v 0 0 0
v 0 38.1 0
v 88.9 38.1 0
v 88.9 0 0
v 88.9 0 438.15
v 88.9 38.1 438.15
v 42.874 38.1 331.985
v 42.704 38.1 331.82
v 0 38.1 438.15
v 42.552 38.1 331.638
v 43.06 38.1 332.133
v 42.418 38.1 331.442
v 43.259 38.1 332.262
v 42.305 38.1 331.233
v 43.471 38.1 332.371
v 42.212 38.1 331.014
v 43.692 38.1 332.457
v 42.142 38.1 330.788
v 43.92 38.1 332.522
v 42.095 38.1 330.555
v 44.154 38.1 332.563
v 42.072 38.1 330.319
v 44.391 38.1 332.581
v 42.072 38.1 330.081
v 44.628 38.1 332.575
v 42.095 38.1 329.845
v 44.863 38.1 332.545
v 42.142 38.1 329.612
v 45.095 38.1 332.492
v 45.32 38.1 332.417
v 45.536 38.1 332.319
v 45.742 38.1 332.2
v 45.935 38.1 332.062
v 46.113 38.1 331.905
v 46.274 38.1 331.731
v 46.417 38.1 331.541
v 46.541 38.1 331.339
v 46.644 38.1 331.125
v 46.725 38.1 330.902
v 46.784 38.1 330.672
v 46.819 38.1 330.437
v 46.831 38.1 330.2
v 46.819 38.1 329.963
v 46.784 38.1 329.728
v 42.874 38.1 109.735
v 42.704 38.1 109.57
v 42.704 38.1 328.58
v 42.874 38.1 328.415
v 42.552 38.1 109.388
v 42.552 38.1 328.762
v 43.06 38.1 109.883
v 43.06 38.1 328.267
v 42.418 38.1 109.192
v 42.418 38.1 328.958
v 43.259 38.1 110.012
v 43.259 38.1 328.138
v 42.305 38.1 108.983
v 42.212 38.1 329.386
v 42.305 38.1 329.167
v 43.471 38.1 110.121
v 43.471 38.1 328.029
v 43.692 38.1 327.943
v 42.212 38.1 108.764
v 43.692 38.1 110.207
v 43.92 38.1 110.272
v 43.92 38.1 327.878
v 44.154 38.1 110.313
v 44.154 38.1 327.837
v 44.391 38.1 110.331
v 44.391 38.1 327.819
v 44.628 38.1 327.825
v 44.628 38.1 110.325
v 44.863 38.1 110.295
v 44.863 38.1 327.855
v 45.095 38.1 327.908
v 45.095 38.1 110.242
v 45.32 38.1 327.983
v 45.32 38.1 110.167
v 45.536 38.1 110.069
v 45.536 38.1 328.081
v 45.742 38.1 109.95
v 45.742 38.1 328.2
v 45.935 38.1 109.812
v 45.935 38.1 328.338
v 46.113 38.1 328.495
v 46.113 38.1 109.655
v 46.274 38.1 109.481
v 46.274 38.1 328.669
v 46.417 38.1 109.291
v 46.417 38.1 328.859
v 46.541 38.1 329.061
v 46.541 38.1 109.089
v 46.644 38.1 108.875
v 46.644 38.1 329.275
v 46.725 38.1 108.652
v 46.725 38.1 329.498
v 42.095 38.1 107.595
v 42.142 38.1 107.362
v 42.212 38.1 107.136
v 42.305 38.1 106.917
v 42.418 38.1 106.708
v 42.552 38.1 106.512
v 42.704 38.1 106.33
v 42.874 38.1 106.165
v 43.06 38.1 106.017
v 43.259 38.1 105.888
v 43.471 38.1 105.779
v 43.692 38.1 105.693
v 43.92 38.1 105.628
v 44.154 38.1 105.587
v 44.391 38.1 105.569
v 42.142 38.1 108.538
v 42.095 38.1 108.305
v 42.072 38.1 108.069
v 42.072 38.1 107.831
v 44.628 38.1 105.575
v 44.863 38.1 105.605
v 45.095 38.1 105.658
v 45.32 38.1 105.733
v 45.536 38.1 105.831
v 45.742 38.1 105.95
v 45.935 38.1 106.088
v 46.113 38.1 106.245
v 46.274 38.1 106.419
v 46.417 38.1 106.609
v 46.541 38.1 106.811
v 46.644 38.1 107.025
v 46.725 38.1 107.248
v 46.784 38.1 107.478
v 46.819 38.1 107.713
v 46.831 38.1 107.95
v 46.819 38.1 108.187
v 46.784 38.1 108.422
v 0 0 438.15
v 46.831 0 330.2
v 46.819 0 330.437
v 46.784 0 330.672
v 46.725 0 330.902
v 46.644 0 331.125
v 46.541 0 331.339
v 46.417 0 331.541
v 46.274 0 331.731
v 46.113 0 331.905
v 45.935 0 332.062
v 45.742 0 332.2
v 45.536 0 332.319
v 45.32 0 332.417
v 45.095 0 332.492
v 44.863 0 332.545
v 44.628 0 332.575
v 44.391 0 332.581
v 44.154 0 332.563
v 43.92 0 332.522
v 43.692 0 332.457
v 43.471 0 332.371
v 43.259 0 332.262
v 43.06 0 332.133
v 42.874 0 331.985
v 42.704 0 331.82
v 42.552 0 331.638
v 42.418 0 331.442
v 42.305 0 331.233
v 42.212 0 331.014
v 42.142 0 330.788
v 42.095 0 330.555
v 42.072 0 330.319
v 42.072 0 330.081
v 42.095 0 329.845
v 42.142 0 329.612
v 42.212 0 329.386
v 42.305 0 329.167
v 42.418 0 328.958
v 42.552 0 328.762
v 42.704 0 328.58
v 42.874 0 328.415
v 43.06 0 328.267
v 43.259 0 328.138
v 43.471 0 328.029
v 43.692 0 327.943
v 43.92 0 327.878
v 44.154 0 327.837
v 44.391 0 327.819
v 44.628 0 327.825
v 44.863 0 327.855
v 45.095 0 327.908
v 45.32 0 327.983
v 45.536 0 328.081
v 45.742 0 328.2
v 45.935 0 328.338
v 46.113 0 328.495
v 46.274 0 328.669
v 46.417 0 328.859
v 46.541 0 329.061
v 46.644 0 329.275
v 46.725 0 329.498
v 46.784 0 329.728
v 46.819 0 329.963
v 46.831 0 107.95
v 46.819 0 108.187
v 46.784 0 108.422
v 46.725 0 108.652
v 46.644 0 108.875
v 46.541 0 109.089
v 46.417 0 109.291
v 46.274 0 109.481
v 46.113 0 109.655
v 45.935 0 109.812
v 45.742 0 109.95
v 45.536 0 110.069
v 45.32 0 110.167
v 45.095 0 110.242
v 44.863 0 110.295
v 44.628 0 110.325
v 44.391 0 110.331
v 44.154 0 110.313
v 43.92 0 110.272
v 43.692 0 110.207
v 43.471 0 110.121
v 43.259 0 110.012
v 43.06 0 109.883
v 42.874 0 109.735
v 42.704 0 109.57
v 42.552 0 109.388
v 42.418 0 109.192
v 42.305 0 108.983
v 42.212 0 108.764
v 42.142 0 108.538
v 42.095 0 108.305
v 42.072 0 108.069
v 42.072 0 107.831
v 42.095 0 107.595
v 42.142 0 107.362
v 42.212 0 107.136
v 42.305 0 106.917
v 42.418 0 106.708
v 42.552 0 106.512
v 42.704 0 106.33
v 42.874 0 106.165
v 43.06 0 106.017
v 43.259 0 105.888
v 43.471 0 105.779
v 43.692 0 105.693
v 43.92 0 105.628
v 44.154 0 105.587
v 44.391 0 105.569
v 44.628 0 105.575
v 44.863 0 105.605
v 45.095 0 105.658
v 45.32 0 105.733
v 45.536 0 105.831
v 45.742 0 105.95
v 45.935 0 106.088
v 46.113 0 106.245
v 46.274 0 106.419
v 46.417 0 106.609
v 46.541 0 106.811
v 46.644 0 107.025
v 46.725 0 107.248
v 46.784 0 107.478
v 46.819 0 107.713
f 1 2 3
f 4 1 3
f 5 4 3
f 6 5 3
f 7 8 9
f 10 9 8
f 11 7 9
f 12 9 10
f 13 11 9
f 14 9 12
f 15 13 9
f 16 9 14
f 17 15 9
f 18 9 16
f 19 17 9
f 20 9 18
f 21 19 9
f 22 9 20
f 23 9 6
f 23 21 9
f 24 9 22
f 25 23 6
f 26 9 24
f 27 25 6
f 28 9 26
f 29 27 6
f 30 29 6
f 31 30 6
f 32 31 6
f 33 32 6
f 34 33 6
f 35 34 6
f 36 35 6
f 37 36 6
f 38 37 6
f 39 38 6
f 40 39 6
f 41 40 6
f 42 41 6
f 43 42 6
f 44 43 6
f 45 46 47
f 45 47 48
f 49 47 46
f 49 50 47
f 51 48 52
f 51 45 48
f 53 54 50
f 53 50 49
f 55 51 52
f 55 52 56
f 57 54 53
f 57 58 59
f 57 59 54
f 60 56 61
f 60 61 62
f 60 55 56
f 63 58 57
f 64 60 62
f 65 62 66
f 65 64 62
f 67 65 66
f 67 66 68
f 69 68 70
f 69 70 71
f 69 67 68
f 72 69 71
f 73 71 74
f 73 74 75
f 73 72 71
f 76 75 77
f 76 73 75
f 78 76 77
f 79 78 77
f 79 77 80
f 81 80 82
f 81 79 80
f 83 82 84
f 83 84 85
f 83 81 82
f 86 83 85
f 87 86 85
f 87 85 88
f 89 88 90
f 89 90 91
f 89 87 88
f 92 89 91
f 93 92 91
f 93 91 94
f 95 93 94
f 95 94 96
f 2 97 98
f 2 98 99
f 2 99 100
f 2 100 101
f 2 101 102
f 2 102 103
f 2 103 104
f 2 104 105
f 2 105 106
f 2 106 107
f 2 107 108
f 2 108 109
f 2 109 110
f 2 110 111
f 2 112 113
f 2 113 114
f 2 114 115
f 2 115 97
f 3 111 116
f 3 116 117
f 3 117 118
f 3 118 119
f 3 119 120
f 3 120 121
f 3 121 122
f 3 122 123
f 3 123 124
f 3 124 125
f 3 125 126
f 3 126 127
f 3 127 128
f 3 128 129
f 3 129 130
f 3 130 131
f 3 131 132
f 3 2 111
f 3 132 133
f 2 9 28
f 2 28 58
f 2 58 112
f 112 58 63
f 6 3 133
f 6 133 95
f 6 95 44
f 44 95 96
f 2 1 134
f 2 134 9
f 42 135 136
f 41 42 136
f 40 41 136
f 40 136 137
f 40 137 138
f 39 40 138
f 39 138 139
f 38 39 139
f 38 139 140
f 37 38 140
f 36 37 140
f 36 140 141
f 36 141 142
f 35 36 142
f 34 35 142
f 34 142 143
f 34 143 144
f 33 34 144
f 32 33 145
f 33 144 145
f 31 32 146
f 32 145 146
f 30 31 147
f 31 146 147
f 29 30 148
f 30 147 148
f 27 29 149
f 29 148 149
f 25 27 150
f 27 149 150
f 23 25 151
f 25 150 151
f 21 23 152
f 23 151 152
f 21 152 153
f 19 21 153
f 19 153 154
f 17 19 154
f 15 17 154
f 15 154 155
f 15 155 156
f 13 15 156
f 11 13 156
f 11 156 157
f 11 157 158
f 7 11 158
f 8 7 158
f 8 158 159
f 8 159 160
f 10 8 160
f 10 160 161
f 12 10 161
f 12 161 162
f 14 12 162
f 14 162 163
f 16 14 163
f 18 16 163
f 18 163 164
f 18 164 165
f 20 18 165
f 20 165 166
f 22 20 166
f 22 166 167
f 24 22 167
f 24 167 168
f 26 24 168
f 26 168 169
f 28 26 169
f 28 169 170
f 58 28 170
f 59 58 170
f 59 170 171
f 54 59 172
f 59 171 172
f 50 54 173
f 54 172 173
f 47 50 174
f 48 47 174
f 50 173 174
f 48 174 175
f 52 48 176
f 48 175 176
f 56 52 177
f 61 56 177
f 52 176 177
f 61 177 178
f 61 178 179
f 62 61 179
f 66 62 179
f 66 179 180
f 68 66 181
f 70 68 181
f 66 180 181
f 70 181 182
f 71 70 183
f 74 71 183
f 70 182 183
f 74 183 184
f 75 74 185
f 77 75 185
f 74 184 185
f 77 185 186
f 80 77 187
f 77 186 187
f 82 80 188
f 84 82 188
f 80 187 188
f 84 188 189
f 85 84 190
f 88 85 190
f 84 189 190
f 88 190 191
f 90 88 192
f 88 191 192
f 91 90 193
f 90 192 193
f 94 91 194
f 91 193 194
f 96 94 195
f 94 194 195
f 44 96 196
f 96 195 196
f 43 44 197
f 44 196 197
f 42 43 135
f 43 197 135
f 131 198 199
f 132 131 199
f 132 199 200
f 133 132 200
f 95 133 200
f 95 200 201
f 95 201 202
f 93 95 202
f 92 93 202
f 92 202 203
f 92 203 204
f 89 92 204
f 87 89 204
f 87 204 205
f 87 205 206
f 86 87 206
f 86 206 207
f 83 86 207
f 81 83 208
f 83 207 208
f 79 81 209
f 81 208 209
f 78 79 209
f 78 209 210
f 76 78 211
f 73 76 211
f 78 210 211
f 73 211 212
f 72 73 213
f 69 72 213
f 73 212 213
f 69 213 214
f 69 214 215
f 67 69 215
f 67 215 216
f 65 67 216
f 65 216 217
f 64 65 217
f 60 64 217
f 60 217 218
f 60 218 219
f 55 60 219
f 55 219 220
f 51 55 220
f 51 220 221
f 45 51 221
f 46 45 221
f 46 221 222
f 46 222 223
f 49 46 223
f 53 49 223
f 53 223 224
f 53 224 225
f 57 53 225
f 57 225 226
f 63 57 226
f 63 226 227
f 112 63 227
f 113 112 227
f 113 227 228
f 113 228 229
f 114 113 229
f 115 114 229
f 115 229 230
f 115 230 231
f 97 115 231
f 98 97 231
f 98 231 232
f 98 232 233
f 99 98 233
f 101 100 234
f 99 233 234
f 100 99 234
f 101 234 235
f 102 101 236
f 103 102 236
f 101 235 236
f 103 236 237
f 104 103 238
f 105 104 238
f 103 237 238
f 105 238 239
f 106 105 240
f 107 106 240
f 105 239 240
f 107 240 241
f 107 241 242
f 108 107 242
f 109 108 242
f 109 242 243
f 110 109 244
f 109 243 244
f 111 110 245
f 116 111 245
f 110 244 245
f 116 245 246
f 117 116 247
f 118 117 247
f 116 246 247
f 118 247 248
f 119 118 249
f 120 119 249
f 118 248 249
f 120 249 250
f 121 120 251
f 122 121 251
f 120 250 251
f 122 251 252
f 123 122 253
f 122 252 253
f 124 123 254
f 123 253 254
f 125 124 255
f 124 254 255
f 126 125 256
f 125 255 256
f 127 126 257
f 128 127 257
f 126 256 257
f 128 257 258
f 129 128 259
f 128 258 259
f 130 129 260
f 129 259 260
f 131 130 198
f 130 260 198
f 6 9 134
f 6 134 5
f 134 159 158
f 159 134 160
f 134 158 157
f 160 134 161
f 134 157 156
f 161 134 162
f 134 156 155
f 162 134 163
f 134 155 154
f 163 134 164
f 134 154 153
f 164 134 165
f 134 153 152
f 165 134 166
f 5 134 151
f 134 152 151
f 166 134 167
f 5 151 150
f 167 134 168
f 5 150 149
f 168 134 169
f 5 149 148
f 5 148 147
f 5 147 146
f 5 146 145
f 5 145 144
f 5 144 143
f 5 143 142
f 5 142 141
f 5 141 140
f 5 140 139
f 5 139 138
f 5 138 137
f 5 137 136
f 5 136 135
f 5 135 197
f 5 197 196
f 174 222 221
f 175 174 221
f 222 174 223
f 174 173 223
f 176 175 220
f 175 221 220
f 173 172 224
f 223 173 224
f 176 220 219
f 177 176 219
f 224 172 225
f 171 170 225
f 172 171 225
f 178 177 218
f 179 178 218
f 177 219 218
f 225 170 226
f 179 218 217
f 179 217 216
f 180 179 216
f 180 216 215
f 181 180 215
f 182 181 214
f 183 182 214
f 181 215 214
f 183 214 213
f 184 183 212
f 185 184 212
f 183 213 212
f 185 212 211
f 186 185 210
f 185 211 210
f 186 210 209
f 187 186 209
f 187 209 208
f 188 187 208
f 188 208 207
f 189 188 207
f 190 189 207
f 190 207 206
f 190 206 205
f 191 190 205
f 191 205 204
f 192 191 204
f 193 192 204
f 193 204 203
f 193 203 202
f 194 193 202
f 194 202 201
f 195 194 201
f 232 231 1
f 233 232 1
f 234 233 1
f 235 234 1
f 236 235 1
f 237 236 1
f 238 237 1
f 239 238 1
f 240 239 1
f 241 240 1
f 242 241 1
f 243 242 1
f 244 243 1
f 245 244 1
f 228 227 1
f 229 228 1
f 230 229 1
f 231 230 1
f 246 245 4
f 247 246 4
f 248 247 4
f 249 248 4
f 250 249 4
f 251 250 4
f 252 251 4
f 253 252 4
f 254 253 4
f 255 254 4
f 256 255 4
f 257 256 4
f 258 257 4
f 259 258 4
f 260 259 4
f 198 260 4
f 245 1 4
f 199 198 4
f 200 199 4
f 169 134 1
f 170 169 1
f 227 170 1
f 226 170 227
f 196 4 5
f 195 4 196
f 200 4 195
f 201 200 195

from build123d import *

# Parameters (mm, degrees)
SKETCH001_AS_DRAWN_R                 = 2.38125
EXTRUDE001_DEPTH                     = 76.2
EXTRUDE001_ONTO_SKETCH001_ROLL_ANGLE = 90
SKETCH_W                             = 88.9
SKETCH_H                             = 38.1
EXTRUDE_DEPTH                        = 438.15


with BuildPart() as extrude001:
    # Sketch001 as drawn → Extrude001 (new)
    with BuildSketch(Plane.XY):
        with Locations((44.45, 107.95)):
            Circle(SKETCH001_AS_DRAWN_R)
        with Locations((44.45, 330.2)):
            Circle(SKETCH001_AS_DRAWN_R)
    extrude(amount=-EXTRUDE001_DEPTH)


with BuildPart() as extrude001_1:
    # Extrude001 onto Sketch001 roll: moved
    add(extrude001.part.rotate(Axis((0, 0, 0), (1, 0, 0)), EXTRUDE001_ONTO_SKETCH001_ROLL_ANGLE))


with BuildPart() as extrude001_2:
    # Extrude001 onto Sketch001 placement: moved
    add(extrude001_1.part)


with BuildPart() as cut:
    # Sketch → Extrude (new body)
    with BuildSketch(Plane.XY):
        with Locations((44.45, 19.05)):
            Rectangle(SKETCH_W, SKETCH_H)
    extrude(amount=EXTRUDE_DEPTH)

    # Cut: cut Extrude001
    add(extrude001_2.part, mode=Mode.SUBTRACT)


solid = cut.part
